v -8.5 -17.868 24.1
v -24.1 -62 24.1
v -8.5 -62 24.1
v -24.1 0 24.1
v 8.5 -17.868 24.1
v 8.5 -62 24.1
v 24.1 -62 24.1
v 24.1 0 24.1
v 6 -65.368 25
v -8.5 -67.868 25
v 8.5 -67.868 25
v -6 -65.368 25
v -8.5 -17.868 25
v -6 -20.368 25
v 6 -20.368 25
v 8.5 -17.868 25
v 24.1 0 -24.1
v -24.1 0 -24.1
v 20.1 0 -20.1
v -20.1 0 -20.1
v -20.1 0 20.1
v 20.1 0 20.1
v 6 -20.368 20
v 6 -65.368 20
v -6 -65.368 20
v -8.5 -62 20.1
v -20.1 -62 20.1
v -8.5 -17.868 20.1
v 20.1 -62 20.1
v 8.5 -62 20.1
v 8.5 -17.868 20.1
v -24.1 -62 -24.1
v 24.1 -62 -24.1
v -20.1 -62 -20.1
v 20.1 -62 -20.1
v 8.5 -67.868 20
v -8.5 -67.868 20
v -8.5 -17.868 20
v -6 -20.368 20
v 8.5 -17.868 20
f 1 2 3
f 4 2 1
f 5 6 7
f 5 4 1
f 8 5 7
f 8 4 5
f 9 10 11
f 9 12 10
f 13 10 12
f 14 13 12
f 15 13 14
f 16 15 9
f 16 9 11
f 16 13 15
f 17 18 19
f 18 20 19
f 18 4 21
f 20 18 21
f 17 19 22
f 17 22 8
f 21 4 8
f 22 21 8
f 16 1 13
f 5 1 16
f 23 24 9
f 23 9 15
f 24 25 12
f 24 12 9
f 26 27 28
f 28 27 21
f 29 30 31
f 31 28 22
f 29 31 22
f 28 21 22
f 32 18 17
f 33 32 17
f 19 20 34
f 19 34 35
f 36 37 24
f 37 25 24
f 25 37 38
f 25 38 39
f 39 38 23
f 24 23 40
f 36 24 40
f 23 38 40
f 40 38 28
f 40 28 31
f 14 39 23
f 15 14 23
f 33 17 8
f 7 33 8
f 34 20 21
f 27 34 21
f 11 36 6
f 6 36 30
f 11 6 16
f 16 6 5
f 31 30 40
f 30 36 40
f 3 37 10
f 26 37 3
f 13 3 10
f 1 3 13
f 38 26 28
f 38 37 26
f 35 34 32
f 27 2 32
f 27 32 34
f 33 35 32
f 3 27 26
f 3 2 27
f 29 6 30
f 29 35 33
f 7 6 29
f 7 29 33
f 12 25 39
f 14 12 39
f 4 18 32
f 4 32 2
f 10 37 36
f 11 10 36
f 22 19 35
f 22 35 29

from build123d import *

# Parameters (mm, degrees)
F0_W        = 48.2
F0_H        = 48.2
F0_W_2      = 40.2
F0_H_2      = 40.2
F1_DEPTH    = 62
F3_START    = 20
F2_W        = 17
F2_H        = 50
F3_DEPTH    = 5
F4_T        = 2.5
F4_T3_DEPTH = 49.1321159601
F4_T5_DEPTH = 22
F4_T7_DEPTH = 9
F4_T9_DEPTH = 67


# Not quite as in the source:
# - a shell that OpenCascade refuses in one call is made with other operations: the cavity is built on its own and cut out


with BuildPart() as f1:
    # F0 (on Front) → F1 (new body)
    with BuildSketch(Plane.XZ):
        Rectangle(F0_W, F0_H)
        Rectangle(F0_W_2, F0_H_2, mode=Mode.SUBTRACT)
    extrude(amount=F1_DEPTH)

    # F2 (on Top) → F3 (join)
    with BuildSketch(Plane.XY.offset(F3_START)):
        with Locations((0, -42.8678840399)):
            Rectangle(F2_W, F2_H)
    extrude(amount=F3_DEPTH)

    # F4: shell of thickness 2.5, made by hand


with BuildPart() as f4_core1:
    # F4_t2: copy of F1
    add(f1.part)

    # the walls: a layer under each face that stays
    f4_faces = [f4_core1.faces().sort_by_distance(p)[0] for p in [
        (24.1, -31, 0),
        (0, -31, -24.1),
        (16.0666666667, -51.6666666667, 24.1),
        (-20.6571428571, 0, -20.6571428571),
        (-20.6571428571, -62, -20.6571428571),
        (-24.1, -31, 0),
        (-8.5, -26.2012173732, 24.1666666667),
        (0, -17.8678840399, 24.55),
        (8.5, -59.5345507065, 24.1666666667),
        (20.1, -31, 0),
        (0, -31, -20.1),
        (-20.1, -31, 0),
        (-13.4, -51.6666666667, 20.1),
        (0, -67.8678840399, 22.5),
        (0, -17.8678840399, 20.05),
    ]]
    thicken(f4_faces, amount=-F4_T, mode=Mode.SUBTRACT)

    # F4_s4 → F4_t3 (cut)
    with BuildSketch(Plane.XZ.offset(15.3678840399)):
        Polygon((-8.525, 24.125), (-8.5, 21.6), (-6, 21.6), (-6, 24.1), align=None)
        Polygon((8.525, 24.125), (8.5, 21.6), (6, 21.6), (6, 24.1), align=None)
        Polygon((-8.525, 20.075), (-6, 20.1), (-6, 22.6), (-8.5, 22.6), align=None)
        Polygon((8.525, 20.075), (6, 20.1), (6, 22.6), (8.5, 22.6), align=None)
    extrude(amount=F4_T3_DEPTH, mode=Mode.SUBTRACT)

    # F4_s6 → F4_t5 (cut)
    with BuildSketch(Plane.YZ.offset(-11)):
        Polygon((-17.8428840399, 24.125), (-17.8678840399, 21.6), (-20.3678840399, 21.6), (-20.3678840399, 24.1), align=None)
        Polygon((-17.8428840399, 20.075), (-17.8678840399, 22.6), (-20.3678840399, 22.6), (-20.3678840399, 20.1), align=None)
    extrude(amount=F4_T5_DEPTH, mode=Mode.SUBTRACT)

    # F4_s8 → F4_t7 (cut)
    with BuildSketch(Plane.XY.offset(17.6)):
        Polygon((-8.525, -62.025), (-8.5, -59.5), (-6, -59.5), (-6, -62), align=None)
        Polygon((8.525, -62.025), (8.5, -59.5), (6, -59.5), (6, -62), align=None)
    extrude(amount=F4_T7_DEPTH, mode=Mode.SUBTRACT)

    # F4_s10 → F4_t9 (cut)
    with BuildSketch(Plane.XZ.offset(-2.5)):
        Polygon((20.075, 20.075), (22.6, 20.1), (22.6, 22.6), (20.1, 22.6), align=None)
        Polygon((20.075, -20.075), (22.6, -20.1), (22.6, -22.6), (20.1, -22.6), align=None)
        Polygon((-20.075, -20.075), (-20.1, -22.6), (-22.6, -22.6), (-22.6, -20.1), align=None)
        Polygon((-20.075, 20.075), (-22.6, 20.1), (-22.6, 22.6), (-20.1, 22.6), align=None)
    extrude(amount=F4_T9_DEPTH, mode=Mode.SUBTRACT)


with BuildPart() as f1_1:
    add(f1.part)

    # what is left inside the walls is the cavity
    f4_cavity = [f4_core1.part.solids().sort_by_distance(p)[0] for p in [
        (0, -50.367884, 20.025),
    ]]
    add(f4_cavity, mode=Mode.SUBTRACT)


solid = f1_1.part
